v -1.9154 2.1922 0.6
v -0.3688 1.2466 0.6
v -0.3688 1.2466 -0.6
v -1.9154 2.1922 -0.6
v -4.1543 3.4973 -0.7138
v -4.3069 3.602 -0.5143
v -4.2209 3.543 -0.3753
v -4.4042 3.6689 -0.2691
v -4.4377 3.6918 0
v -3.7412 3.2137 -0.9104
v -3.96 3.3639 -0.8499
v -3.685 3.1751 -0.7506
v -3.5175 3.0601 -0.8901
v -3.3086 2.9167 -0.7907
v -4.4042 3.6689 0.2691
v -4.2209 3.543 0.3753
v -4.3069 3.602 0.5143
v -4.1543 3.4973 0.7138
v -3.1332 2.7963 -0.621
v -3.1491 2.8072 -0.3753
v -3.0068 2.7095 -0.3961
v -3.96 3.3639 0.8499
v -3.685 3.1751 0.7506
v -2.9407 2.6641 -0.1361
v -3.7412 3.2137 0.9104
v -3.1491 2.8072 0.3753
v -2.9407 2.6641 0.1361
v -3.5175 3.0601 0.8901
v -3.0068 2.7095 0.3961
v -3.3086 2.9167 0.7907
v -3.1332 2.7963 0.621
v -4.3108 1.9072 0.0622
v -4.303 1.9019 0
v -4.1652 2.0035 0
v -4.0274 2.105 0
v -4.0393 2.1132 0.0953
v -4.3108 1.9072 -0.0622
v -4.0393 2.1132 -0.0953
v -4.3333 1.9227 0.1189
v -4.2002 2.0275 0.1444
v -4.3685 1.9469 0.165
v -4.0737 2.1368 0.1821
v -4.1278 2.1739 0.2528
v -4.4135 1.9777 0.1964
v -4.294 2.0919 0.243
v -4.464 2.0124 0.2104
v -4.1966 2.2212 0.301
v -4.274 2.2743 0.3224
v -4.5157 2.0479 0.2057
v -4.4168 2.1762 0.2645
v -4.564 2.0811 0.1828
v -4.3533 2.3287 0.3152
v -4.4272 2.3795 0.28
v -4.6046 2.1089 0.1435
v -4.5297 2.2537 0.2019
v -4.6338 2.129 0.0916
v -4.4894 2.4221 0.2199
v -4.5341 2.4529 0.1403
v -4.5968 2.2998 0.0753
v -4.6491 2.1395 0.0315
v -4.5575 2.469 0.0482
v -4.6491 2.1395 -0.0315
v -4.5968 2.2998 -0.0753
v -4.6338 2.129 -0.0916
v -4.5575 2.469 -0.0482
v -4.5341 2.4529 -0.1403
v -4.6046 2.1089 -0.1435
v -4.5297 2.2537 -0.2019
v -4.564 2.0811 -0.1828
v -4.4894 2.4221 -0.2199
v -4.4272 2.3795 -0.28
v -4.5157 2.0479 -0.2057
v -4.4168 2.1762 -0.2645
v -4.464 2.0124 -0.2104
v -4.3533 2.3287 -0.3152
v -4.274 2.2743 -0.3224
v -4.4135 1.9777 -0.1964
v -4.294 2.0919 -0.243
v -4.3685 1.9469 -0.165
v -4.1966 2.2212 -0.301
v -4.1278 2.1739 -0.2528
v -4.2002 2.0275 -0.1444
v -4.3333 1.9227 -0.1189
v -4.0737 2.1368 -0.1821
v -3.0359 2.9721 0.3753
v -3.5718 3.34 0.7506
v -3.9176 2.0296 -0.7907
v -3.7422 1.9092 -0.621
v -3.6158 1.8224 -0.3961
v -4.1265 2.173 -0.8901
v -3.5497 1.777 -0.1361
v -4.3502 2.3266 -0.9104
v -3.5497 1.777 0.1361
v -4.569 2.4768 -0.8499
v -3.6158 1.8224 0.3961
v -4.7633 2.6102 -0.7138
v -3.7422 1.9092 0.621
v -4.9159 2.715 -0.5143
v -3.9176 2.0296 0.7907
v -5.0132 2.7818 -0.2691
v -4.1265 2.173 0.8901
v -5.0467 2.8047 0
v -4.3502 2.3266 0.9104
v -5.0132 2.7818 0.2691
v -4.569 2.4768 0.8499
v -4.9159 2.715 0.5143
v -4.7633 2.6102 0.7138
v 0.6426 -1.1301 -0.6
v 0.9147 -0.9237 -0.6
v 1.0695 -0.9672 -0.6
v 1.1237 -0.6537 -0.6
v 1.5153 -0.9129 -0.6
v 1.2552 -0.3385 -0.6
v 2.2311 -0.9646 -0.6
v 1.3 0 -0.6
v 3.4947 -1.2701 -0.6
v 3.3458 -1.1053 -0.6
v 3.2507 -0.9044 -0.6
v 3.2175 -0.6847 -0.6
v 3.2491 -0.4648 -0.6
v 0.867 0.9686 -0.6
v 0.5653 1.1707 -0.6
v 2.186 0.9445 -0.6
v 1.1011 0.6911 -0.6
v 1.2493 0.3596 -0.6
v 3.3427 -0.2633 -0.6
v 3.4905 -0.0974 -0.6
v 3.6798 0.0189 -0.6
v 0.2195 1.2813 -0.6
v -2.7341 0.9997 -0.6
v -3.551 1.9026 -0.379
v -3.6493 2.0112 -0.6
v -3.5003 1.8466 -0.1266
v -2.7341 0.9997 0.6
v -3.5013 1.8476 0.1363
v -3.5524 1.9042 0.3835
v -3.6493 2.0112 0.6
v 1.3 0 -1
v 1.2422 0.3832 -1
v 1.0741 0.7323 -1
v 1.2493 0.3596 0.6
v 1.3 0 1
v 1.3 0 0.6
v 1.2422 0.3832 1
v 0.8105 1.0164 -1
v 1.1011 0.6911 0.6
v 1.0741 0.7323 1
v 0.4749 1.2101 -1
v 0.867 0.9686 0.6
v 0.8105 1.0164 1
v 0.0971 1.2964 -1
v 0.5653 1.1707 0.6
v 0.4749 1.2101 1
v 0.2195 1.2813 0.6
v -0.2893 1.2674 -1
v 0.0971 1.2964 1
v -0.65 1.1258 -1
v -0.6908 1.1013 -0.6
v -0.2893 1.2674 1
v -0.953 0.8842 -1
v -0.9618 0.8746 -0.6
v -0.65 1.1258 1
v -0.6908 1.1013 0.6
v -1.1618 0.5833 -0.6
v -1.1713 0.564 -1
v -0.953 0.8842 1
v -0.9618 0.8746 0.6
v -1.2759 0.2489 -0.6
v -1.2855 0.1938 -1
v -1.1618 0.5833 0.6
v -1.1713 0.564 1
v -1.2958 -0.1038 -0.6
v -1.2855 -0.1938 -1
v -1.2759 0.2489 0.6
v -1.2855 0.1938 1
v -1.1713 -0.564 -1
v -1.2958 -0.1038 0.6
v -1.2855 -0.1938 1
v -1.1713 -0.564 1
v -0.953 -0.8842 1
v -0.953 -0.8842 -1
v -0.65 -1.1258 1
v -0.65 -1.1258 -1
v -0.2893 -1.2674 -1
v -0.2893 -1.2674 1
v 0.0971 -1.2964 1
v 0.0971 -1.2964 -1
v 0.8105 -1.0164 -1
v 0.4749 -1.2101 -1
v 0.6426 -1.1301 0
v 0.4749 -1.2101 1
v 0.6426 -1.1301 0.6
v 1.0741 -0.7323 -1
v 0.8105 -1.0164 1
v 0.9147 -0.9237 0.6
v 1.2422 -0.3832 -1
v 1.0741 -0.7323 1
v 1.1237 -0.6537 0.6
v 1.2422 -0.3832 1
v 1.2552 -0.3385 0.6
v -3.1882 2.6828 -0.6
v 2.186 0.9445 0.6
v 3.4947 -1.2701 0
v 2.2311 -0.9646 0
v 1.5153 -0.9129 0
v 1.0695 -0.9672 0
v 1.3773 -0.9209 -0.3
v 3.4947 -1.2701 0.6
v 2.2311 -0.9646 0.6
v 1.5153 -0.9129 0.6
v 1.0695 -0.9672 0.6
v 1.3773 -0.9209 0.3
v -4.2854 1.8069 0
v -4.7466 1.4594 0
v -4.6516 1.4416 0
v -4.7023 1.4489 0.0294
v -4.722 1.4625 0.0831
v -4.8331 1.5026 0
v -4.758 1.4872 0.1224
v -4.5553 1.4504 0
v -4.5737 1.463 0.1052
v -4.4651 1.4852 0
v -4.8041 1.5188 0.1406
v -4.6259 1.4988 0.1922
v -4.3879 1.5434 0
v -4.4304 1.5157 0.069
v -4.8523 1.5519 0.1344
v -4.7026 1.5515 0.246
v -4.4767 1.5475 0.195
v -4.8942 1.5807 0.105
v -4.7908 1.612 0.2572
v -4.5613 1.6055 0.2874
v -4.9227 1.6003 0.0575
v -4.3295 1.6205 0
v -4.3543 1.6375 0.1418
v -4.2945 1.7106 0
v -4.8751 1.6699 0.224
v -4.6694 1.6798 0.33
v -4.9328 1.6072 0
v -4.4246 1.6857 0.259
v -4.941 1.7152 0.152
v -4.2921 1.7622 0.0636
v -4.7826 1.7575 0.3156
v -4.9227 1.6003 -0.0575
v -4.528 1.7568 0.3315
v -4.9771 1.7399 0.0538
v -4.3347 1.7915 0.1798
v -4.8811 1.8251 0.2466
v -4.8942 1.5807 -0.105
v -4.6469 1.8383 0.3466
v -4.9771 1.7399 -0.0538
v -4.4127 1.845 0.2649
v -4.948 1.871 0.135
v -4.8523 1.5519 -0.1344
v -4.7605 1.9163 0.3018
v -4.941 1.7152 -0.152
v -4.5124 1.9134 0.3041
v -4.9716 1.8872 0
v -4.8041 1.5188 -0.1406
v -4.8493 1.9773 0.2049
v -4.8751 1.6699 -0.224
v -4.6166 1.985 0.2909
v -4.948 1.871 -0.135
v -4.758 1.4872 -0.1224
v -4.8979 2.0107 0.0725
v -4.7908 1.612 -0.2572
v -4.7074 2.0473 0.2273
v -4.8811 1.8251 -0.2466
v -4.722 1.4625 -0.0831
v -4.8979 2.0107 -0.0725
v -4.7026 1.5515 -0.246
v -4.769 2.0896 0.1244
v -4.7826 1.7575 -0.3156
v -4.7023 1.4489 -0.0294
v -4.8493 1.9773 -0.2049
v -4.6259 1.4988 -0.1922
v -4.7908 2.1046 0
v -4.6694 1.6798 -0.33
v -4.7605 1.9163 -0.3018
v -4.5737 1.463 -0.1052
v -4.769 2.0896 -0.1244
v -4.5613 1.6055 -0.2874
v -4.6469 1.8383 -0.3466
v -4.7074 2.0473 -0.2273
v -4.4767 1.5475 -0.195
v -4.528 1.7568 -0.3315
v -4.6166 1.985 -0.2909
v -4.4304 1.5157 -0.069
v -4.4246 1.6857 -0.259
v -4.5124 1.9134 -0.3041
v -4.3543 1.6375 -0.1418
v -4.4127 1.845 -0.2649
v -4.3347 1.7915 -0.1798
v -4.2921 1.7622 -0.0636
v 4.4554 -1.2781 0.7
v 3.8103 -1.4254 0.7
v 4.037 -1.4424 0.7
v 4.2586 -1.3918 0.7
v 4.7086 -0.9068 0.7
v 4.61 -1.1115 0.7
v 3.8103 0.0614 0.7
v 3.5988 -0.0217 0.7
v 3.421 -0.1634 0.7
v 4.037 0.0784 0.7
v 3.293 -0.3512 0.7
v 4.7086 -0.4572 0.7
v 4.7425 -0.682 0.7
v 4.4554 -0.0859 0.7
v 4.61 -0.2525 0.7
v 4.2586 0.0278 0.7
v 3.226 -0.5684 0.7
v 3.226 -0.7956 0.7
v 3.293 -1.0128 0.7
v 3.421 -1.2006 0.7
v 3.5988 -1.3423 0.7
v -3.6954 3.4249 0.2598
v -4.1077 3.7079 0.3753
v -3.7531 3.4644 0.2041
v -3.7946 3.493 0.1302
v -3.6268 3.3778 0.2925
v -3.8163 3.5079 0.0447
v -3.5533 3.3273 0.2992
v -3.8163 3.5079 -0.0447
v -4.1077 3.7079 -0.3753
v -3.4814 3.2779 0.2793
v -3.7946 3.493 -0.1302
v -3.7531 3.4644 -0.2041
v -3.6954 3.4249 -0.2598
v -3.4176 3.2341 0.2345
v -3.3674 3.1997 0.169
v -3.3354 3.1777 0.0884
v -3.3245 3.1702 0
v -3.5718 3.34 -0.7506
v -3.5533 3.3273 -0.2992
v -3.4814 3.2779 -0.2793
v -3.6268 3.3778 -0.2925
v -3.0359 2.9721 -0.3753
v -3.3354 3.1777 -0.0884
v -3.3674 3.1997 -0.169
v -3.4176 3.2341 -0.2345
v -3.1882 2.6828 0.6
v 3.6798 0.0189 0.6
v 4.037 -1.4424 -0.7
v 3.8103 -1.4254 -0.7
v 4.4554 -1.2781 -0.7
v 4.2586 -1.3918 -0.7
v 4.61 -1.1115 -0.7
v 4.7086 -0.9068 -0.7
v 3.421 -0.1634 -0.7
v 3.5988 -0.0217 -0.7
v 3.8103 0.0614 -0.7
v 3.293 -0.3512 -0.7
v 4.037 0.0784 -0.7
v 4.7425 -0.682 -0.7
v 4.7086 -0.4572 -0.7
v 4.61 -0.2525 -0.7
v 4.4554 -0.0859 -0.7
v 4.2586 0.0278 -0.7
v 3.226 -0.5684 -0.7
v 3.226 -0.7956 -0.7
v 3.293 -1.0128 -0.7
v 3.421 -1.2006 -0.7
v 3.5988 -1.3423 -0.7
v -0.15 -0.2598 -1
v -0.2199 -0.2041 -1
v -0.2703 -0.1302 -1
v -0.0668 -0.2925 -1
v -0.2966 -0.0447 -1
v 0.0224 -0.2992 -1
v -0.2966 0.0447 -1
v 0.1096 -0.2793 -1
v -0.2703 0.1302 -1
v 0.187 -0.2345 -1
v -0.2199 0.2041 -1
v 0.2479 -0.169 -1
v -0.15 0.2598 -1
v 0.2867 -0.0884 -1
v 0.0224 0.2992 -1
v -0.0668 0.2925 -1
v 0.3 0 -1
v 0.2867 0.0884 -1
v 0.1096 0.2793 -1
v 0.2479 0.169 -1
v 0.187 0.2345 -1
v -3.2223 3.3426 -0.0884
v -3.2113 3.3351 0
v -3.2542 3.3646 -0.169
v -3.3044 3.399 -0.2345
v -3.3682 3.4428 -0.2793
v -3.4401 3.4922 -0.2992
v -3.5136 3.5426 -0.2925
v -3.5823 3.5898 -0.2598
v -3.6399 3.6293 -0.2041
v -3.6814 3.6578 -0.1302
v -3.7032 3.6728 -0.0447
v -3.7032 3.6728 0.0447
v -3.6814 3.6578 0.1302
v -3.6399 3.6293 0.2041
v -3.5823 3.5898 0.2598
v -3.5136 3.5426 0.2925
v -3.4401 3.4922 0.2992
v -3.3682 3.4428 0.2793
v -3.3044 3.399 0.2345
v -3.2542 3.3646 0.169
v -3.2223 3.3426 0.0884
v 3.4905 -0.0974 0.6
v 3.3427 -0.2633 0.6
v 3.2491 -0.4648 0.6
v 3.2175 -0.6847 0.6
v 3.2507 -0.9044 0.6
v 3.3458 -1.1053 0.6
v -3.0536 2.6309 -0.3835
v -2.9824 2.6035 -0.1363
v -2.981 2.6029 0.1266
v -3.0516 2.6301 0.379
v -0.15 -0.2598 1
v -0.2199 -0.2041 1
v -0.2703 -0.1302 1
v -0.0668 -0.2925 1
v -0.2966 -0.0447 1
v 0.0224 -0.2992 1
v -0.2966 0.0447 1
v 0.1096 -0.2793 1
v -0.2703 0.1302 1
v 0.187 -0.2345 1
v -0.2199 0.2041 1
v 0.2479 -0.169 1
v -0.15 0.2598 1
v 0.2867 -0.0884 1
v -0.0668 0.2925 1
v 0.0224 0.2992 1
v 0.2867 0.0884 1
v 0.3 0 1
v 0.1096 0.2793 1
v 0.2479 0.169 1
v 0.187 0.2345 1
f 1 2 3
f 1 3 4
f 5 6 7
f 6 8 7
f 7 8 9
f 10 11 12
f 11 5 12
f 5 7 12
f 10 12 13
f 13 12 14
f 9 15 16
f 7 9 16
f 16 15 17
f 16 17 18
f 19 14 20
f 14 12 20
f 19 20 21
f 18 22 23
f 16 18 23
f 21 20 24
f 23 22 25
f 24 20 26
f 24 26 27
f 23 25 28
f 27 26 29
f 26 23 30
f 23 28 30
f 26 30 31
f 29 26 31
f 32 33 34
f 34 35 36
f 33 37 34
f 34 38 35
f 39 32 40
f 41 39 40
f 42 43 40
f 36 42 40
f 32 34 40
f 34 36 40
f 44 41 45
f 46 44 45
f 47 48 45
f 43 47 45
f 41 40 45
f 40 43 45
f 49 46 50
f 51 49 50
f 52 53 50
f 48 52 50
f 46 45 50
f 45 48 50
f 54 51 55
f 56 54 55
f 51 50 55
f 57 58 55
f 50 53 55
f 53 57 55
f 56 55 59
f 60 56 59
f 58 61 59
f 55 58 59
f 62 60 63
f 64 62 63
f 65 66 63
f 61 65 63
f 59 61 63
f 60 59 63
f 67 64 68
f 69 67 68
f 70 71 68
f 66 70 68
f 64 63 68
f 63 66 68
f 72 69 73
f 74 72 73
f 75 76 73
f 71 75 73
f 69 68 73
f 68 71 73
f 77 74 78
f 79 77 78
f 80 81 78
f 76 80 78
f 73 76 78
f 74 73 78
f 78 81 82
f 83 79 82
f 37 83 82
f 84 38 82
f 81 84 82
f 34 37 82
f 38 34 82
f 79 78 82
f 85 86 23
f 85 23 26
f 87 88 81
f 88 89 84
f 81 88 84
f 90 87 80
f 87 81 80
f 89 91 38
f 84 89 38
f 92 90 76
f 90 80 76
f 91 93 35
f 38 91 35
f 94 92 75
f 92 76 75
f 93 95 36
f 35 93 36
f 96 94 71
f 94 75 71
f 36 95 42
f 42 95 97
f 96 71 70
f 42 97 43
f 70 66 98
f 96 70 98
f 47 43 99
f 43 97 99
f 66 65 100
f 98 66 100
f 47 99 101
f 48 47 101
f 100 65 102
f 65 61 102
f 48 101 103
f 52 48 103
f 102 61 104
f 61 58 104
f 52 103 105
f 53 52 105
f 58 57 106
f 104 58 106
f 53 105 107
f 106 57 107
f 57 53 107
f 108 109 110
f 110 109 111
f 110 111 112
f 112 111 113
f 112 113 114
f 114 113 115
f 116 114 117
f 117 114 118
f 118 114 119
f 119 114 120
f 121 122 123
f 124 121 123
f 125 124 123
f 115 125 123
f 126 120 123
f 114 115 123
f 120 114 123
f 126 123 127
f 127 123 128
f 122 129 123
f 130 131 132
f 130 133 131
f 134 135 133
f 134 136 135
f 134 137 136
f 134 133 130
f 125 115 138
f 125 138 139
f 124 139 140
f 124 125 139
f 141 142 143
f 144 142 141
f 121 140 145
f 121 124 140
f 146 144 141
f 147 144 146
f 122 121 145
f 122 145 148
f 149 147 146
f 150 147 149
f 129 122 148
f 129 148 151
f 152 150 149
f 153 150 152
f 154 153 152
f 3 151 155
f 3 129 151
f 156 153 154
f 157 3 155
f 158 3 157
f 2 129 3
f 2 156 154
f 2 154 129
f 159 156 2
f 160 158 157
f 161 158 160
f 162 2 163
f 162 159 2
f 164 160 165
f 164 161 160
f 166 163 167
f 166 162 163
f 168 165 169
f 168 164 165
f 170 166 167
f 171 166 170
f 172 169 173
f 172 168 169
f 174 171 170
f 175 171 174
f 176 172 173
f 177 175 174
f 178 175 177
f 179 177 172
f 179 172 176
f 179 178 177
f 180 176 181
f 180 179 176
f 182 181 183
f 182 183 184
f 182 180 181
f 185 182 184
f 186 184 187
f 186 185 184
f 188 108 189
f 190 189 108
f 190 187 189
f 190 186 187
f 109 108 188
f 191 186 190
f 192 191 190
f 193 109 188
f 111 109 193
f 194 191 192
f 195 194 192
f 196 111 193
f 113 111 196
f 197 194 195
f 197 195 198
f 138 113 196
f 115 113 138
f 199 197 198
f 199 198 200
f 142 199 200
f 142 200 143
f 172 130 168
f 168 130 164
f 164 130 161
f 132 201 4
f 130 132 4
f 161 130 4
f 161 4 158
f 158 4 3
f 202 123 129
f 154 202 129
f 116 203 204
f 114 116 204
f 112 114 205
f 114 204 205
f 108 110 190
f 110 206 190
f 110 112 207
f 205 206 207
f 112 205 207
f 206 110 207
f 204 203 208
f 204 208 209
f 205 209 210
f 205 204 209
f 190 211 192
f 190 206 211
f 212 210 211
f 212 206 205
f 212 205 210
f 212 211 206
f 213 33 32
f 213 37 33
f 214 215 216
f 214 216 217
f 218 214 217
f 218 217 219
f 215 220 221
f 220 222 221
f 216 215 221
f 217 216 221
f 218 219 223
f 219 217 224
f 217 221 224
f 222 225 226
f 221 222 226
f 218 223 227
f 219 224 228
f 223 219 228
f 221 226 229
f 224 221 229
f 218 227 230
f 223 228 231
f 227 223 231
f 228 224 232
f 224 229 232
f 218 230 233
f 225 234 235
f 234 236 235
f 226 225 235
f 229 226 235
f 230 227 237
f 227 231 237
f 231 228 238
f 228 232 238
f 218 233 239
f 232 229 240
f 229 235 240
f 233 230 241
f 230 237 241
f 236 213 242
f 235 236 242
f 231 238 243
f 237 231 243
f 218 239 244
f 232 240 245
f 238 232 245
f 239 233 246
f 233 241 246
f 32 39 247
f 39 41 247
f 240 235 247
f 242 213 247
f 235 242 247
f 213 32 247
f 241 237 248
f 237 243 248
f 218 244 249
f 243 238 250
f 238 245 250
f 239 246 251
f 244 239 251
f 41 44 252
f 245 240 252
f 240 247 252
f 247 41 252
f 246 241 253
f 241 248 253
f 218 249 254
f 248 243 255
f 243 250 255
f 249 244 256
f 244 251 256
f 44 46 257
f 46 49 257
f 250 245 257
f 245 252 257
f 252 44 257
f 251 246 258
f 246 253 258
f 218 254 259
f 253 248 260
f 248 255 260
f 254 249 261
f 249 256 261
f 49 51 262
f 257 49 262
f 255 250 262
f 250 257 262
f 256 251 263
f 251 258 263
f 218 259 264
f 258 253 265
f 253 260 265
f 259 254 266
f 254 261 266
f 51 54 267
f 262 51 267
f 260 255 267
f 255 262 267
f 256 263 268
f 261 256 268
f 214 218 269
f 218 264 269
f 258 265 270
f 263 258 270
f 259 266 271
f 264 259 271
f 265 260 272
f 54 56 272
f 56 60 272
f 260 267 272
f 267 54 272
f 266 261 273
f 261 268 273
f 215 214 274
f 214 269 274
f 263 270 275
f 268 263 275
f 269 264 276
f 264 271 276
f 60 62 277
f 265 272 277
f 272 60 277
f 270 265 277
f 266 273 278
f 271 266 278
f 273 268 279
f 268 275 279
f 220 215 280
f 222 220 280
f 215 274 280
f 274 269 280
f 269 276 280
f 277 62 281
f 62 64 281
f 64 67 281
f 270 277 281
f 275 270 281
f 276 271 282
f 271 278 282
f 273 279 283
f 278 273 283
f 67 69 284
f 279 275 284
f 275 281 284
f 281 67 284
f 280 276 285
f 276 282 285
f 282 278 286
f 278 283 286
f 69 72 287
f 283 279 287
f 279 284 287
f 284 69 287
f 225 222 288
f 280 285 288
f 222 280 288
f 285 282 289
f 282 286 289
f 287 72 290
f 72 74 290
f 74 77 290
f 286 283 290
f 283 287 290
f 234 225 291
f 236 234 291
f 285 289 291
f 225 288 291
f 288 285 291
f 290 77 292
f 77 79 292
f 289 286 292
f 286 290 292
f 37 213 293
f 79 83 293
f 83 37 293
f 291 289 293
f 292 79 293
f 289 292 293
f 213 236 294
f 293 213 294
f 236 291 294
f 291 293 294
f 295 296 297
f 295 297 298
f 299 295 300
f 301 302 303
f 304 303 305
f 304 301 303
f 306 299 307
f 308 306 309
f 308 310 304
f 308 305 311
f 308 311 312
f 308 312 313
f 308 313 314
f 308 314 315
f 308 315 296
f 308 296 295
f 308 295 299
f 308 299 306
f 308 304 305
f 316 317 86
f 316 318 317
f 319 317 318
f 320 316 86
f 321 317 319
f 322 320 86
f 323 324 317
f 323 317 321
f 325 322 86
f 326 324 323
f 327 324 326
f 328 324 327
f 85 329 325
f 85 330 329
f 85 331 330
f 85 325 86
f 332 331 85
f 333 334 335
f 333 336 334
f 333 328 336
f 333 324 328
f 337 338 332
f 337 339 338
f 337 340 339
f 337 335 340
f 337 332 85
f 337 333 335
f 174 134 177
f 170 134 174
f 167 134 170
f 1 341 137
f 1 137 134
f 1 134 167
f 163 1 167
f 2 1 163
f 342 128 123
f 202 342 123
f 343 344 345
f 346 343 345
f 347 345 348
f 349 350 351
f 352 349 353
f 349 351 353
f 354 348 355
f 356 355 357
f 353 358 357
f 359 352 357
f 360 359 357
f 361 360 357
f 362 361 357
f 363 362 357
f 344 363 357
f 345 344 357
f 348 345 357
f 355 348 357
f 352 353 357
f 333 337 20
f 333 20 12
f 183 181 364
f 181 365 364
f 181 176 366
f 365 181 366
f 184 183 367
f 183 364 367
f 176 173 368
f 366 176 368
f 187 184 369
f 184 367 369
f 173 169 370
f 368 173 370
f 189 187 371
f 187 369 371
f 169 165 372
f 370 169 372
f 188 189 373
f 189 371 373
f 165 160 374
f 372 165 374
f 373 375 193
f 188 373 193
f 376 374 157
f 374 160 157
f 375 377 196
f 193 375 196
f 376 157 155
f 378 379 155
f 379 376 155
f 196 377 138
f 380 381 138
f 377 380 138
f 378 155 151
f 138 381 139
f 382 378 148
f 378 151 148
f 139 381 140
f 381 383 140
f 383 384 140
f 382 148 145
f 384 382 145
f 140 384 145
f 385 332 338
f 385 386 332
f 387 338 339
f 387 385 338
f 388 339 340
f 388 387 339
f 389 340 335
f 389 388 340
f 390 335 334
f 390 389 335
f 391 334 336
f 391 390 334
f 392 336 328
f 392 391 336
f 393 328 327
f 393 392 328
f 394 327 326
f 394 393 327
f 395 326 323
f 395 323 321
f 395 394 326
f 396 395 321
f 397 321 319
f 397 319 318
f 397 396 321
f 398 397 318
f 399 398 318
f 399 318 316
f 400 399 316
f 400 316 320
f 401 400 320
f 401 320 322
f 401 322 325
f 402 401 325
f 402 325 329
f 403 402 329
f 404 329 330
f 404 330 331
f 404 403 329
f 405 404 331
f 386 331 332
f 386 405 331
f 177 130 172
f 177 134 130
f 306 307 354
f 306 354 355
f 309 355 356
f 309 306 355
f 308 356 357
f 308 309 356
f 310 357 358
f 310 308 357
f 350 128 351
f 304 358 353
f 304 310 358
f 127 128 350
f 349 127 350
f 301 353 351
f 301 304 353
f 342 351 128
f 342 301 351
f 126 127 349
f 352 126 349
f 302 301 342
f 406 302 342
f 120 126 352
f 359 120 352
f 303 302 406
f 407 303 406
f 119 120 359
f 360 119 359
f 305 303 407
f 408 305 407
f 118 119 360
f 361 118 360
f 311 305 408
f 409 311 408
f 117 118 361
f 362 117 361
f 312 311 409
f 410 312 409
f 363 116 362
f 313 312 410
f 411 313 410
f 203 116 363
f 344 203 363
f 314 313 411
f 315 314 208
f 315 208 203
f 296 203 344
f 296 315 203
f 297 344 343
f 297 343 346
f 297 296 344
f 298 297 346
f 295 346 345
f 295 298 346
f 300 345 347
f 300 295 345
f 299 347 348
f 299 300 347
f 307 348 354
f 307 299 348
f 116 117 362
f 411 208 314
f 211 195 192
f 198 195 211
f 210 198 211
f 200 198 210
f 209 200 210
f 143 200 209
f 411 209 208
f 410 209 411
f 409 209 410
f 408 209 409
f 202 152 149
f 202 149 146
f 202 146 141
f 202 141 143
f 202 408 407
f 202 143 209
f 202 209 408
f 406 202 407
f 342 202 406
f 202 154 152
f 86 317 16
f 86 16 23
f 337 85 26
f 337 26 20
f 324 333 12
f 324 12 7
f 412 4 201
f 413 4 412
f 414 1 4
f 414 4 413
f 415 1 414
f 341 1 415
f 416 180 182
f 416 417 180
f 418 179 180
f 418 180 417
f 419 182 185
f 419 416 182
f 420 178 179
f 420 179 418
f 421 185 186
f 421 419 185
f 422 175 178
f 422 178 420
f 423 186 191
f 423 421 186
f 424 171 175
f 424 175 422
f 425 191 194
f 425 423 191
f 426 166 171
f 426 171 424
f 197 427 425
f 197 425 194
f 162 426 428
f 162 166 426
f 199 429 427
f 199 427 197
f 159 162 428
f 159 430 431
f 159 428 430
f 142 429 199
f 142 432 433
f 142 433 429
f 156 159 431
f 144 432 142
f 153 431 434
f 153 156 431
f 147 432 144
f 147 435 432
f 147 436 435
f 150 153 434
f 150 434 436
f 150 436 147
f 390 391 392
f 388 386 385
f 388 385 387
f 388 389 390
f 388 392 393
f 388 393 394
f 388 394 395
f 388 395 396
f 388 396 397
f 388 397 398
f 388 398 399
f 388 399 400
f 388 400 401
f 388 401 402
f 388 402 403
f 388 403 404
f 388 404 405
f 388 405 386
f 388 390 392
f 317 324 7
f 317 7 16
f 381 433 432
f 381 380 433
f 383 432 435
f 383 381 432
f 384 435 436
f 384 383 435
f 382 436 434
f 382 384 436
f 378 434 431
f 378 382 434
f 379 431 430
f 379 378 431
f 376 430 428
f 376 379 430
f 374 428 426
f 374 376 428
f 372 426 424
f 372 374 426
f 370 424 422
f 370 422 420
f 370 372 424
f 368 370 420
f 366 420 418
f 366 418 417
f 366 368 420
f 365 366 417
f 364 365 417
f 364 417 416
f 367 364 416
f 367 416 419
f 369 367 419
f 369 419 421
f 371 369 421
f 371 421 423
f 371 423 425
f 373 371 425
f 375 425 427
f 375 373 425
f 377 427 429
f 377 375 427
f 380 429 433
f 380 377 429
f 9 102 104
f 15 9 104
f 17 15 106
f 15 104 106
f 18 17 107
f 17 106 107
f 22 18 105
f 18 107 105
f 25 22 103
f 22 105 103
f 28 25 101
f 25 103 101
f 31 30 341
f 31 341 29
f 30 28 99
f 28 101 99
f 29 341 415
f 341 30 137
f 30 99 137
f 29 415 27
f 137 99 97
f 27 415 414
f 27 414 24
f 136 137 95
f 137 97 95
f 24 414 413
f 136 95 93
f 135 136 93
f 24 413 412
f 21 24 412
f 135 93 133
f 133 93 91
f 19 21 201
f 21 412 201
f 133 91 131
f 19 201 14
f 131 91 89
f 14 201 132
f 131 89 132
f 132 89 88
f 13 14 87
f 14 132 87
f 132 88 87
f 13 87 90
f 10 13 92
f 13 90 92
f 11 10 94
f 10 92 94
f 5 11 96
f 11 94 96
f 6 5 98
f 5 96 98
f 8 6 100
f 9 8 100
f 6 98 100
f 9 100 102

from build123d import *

# Parameters (mm, degrees)
SKETCH1_R           = 0.3
BOSS_EXTRUDE1_DEPTH = 1
BOSS_EXTRUDE2_DEPTH = 0.7
BOSS_EXTRUDE3_DEPTH = 0.6
BOSS_EXTRUDE4_DEPTH = 0.2
SKETCH5_R           = 0.3
BOSS_EXTRUDE5_DEPTH = 0.2


with BuildPart() as part:
    # Sketch1 → Boss-Extrude1 (new, symmetric)
    with BuildSketch(Plane.XY):
        with BuildLine():
            ThreePointArc((1.3, 0), (0.993808417, 0.838060159), (0.219469493, 1.281340369))
            ThreePointArc((0.219469493, 1.281340369), (-0.076650989, 1.297738273), (-0.368782161, 1.24659525))
            ThreePointArc((-0.368782161, 1.24659525), (-1.071749439, 0.735767042), (-1.295848634, -0.103809043))
            ThreePointArc((-1.295848634, -0.103809043), (-0.608256692, -1.148922885), (0.642618962, -1.13006233))
            ThreePointArc((0.642618962, -1.13006233), (1.123700283, -0.653680101), (1.3, 0))
        make_face()
        Circle(SKETCH1_R, mode=Mode.SUBTRACT)
    extrude(amount=BOSS_EXTRUDE1_DEPTH, both=True)



with BuildPart() as body_2:
    # Sketch1<3> → Boss-Extrude2 (new, symmetric)
    with BuildSketch(Plane.XY):
        with BuildLine():
            ThreePointArc((4.7425, -0.682), (4.399845934, -0.045497336), (3.679849137, 0.018939162))
            ThreePointArc((3.679849137, 0.018939162), (3.22524382, -0.573605538), (3.494717907, -1.270139049))
            ThreePointArc((3.494717907, -1.270139049), (4.30509895, -1.371722352), (4.7425, -0.682))
        make_face()
    extrude(amount=BOSS_EXTRUDE2_DEPTH, both=True)


with BuildPart() as part_1:
    add(part.part)

    add(body_2.part)  # Boss-Extrude3 merges body 2
    # Sketch1<4> → Boss-Extrude3 (add, symmetric)
    with BuildSketch(Plane.XY):
        with BuildLine():
            Line((2.186048651, 0.944502367), (0.219469493, 1.281340369))
            ThreePointArc((0.219469493, 1.281340369), (1.280435422, 0.224688962), (0.642618962, -1.13006233))
            add(Edge.make_bspline(
                [(3.494717907, -1.270139049), (2.819202825, -1.086203937), (1.830443771, -0.782374183), (0.874191176, -0.998376943), (0.642618962, -1.13006233)],
                knots=[0, 0, 0, 0, 0.738093499, 1, 1, 1, 1], degree=3))
            ThreePointArc((3.494717907, -1.270139049), (3.22524382, -0.573605538), (3.679849137, 0.018939162))
            Line((3.679849137, 0.018939162), (2.186048651, 0.944502367))
        make_face()
        with BuildLine():
            ThreePointArc((-1.295848634, -0.103809043), (-1.071749439, 0.735767042), (-0.368782161, 1.24659525))
            Line((-0.368782161, 1.24659525), (-1.915411787, 2.192219906))
            Line((-1.915411787, 2.192219906), (-3.469420101, 2.791170079))
            Line((-3.469420101, 2.791170079), (-3.851452989, 2.234684794))
            Line((-3.851452989, 2.234684794), (-2.734084179, 0.999707022))
            Line((-2.734084179, 0.999707022), (-1.295848634, -0.103809043))
        make_face()
    extrude(amount=BOSS_EXTRUDE3_DEPTH, both=True)



with BuildPart() as body_2_2:
    # Sketch2 → Revolve1 (revolve)
    with BuildSketch(Plane.XY):
        with BuildLine():
            Line((-3.851452989, 2.234684794), (-3.443951242, 2.828269098))
            Line((-3.443951242, 2.828269098), (-3.769598187, 3.051829084))
            Line((-3.769598187, 3.051829084), (-4.833144721, 1.502622153))
            ThreePointArc((-4.833144721, 1.502622153), (-4.424469448, 1.511609143), (-4.303041686, 1.901931501))
            Line((-4.303041686, 1.901931501), (-3.851452989, 2.234684794))
        make_face()
    revolve(axis=Axis((-3.769598187, 3.051829084, 0), (-0.565974647839503, -0.8244226452511785, 0)))


with BuildPart() as part_2:
    add(part_1.part)

    add(body_2_2.part)  # Revolve2 merges body 2 2
    # Sketch3 → Revolve2 (revolve)
    with BuildSketch(Plane.XY):
        Polygon((-4.2939678, 2.288010094), (-3.684979079, 3.175088861), (-4.437676954, 3.691823714), (-5.046665676, 2.804744948), align=None)
    revolve(axis=Axis((-4.2939678, 2.288010094, 0), (0.5659746478395024, 0.824422645251179, 0)))

    # Sketch4 → Boss-Extrude4 (add, symmetric)
    with BuildSketch(Plane(origin=(0.30110441, 0.438601438, 0), x_dir=(0.8244226452511789, -0.5659746478395025, 0), z_dir=(0.5659746478395025, 0.8244226452511789, 0))):
        Polygon((-4.185, 0.375277675), (-4.835, 0.75055535), (-5.485, 0.375277675), (-5.485, -0.375277675), (-4.835, -0.75055535), (-4.185, -0.375277675), align=None)
    extrude(amount=BOSS_EXTRUDE4_DEPTH, both=True)

    # Sketch5 → Boss-Extrude5 (add, symmetric)
    with BuildSketch(Plane(origin=(0.41429934, 0.603485967, 0), x_dir=(0.8244226452511786, -0.5659746478395029, 0), z_dir=(0.5659746478395029, 0.8244226452511786, 0))):
        with Locations((-4.835, 0)):
            Circle(SKETCH5_R)
    extrude(amount=BOSS_EXTRUDE5_DEPTH, both=True)


solid = part_2.part
